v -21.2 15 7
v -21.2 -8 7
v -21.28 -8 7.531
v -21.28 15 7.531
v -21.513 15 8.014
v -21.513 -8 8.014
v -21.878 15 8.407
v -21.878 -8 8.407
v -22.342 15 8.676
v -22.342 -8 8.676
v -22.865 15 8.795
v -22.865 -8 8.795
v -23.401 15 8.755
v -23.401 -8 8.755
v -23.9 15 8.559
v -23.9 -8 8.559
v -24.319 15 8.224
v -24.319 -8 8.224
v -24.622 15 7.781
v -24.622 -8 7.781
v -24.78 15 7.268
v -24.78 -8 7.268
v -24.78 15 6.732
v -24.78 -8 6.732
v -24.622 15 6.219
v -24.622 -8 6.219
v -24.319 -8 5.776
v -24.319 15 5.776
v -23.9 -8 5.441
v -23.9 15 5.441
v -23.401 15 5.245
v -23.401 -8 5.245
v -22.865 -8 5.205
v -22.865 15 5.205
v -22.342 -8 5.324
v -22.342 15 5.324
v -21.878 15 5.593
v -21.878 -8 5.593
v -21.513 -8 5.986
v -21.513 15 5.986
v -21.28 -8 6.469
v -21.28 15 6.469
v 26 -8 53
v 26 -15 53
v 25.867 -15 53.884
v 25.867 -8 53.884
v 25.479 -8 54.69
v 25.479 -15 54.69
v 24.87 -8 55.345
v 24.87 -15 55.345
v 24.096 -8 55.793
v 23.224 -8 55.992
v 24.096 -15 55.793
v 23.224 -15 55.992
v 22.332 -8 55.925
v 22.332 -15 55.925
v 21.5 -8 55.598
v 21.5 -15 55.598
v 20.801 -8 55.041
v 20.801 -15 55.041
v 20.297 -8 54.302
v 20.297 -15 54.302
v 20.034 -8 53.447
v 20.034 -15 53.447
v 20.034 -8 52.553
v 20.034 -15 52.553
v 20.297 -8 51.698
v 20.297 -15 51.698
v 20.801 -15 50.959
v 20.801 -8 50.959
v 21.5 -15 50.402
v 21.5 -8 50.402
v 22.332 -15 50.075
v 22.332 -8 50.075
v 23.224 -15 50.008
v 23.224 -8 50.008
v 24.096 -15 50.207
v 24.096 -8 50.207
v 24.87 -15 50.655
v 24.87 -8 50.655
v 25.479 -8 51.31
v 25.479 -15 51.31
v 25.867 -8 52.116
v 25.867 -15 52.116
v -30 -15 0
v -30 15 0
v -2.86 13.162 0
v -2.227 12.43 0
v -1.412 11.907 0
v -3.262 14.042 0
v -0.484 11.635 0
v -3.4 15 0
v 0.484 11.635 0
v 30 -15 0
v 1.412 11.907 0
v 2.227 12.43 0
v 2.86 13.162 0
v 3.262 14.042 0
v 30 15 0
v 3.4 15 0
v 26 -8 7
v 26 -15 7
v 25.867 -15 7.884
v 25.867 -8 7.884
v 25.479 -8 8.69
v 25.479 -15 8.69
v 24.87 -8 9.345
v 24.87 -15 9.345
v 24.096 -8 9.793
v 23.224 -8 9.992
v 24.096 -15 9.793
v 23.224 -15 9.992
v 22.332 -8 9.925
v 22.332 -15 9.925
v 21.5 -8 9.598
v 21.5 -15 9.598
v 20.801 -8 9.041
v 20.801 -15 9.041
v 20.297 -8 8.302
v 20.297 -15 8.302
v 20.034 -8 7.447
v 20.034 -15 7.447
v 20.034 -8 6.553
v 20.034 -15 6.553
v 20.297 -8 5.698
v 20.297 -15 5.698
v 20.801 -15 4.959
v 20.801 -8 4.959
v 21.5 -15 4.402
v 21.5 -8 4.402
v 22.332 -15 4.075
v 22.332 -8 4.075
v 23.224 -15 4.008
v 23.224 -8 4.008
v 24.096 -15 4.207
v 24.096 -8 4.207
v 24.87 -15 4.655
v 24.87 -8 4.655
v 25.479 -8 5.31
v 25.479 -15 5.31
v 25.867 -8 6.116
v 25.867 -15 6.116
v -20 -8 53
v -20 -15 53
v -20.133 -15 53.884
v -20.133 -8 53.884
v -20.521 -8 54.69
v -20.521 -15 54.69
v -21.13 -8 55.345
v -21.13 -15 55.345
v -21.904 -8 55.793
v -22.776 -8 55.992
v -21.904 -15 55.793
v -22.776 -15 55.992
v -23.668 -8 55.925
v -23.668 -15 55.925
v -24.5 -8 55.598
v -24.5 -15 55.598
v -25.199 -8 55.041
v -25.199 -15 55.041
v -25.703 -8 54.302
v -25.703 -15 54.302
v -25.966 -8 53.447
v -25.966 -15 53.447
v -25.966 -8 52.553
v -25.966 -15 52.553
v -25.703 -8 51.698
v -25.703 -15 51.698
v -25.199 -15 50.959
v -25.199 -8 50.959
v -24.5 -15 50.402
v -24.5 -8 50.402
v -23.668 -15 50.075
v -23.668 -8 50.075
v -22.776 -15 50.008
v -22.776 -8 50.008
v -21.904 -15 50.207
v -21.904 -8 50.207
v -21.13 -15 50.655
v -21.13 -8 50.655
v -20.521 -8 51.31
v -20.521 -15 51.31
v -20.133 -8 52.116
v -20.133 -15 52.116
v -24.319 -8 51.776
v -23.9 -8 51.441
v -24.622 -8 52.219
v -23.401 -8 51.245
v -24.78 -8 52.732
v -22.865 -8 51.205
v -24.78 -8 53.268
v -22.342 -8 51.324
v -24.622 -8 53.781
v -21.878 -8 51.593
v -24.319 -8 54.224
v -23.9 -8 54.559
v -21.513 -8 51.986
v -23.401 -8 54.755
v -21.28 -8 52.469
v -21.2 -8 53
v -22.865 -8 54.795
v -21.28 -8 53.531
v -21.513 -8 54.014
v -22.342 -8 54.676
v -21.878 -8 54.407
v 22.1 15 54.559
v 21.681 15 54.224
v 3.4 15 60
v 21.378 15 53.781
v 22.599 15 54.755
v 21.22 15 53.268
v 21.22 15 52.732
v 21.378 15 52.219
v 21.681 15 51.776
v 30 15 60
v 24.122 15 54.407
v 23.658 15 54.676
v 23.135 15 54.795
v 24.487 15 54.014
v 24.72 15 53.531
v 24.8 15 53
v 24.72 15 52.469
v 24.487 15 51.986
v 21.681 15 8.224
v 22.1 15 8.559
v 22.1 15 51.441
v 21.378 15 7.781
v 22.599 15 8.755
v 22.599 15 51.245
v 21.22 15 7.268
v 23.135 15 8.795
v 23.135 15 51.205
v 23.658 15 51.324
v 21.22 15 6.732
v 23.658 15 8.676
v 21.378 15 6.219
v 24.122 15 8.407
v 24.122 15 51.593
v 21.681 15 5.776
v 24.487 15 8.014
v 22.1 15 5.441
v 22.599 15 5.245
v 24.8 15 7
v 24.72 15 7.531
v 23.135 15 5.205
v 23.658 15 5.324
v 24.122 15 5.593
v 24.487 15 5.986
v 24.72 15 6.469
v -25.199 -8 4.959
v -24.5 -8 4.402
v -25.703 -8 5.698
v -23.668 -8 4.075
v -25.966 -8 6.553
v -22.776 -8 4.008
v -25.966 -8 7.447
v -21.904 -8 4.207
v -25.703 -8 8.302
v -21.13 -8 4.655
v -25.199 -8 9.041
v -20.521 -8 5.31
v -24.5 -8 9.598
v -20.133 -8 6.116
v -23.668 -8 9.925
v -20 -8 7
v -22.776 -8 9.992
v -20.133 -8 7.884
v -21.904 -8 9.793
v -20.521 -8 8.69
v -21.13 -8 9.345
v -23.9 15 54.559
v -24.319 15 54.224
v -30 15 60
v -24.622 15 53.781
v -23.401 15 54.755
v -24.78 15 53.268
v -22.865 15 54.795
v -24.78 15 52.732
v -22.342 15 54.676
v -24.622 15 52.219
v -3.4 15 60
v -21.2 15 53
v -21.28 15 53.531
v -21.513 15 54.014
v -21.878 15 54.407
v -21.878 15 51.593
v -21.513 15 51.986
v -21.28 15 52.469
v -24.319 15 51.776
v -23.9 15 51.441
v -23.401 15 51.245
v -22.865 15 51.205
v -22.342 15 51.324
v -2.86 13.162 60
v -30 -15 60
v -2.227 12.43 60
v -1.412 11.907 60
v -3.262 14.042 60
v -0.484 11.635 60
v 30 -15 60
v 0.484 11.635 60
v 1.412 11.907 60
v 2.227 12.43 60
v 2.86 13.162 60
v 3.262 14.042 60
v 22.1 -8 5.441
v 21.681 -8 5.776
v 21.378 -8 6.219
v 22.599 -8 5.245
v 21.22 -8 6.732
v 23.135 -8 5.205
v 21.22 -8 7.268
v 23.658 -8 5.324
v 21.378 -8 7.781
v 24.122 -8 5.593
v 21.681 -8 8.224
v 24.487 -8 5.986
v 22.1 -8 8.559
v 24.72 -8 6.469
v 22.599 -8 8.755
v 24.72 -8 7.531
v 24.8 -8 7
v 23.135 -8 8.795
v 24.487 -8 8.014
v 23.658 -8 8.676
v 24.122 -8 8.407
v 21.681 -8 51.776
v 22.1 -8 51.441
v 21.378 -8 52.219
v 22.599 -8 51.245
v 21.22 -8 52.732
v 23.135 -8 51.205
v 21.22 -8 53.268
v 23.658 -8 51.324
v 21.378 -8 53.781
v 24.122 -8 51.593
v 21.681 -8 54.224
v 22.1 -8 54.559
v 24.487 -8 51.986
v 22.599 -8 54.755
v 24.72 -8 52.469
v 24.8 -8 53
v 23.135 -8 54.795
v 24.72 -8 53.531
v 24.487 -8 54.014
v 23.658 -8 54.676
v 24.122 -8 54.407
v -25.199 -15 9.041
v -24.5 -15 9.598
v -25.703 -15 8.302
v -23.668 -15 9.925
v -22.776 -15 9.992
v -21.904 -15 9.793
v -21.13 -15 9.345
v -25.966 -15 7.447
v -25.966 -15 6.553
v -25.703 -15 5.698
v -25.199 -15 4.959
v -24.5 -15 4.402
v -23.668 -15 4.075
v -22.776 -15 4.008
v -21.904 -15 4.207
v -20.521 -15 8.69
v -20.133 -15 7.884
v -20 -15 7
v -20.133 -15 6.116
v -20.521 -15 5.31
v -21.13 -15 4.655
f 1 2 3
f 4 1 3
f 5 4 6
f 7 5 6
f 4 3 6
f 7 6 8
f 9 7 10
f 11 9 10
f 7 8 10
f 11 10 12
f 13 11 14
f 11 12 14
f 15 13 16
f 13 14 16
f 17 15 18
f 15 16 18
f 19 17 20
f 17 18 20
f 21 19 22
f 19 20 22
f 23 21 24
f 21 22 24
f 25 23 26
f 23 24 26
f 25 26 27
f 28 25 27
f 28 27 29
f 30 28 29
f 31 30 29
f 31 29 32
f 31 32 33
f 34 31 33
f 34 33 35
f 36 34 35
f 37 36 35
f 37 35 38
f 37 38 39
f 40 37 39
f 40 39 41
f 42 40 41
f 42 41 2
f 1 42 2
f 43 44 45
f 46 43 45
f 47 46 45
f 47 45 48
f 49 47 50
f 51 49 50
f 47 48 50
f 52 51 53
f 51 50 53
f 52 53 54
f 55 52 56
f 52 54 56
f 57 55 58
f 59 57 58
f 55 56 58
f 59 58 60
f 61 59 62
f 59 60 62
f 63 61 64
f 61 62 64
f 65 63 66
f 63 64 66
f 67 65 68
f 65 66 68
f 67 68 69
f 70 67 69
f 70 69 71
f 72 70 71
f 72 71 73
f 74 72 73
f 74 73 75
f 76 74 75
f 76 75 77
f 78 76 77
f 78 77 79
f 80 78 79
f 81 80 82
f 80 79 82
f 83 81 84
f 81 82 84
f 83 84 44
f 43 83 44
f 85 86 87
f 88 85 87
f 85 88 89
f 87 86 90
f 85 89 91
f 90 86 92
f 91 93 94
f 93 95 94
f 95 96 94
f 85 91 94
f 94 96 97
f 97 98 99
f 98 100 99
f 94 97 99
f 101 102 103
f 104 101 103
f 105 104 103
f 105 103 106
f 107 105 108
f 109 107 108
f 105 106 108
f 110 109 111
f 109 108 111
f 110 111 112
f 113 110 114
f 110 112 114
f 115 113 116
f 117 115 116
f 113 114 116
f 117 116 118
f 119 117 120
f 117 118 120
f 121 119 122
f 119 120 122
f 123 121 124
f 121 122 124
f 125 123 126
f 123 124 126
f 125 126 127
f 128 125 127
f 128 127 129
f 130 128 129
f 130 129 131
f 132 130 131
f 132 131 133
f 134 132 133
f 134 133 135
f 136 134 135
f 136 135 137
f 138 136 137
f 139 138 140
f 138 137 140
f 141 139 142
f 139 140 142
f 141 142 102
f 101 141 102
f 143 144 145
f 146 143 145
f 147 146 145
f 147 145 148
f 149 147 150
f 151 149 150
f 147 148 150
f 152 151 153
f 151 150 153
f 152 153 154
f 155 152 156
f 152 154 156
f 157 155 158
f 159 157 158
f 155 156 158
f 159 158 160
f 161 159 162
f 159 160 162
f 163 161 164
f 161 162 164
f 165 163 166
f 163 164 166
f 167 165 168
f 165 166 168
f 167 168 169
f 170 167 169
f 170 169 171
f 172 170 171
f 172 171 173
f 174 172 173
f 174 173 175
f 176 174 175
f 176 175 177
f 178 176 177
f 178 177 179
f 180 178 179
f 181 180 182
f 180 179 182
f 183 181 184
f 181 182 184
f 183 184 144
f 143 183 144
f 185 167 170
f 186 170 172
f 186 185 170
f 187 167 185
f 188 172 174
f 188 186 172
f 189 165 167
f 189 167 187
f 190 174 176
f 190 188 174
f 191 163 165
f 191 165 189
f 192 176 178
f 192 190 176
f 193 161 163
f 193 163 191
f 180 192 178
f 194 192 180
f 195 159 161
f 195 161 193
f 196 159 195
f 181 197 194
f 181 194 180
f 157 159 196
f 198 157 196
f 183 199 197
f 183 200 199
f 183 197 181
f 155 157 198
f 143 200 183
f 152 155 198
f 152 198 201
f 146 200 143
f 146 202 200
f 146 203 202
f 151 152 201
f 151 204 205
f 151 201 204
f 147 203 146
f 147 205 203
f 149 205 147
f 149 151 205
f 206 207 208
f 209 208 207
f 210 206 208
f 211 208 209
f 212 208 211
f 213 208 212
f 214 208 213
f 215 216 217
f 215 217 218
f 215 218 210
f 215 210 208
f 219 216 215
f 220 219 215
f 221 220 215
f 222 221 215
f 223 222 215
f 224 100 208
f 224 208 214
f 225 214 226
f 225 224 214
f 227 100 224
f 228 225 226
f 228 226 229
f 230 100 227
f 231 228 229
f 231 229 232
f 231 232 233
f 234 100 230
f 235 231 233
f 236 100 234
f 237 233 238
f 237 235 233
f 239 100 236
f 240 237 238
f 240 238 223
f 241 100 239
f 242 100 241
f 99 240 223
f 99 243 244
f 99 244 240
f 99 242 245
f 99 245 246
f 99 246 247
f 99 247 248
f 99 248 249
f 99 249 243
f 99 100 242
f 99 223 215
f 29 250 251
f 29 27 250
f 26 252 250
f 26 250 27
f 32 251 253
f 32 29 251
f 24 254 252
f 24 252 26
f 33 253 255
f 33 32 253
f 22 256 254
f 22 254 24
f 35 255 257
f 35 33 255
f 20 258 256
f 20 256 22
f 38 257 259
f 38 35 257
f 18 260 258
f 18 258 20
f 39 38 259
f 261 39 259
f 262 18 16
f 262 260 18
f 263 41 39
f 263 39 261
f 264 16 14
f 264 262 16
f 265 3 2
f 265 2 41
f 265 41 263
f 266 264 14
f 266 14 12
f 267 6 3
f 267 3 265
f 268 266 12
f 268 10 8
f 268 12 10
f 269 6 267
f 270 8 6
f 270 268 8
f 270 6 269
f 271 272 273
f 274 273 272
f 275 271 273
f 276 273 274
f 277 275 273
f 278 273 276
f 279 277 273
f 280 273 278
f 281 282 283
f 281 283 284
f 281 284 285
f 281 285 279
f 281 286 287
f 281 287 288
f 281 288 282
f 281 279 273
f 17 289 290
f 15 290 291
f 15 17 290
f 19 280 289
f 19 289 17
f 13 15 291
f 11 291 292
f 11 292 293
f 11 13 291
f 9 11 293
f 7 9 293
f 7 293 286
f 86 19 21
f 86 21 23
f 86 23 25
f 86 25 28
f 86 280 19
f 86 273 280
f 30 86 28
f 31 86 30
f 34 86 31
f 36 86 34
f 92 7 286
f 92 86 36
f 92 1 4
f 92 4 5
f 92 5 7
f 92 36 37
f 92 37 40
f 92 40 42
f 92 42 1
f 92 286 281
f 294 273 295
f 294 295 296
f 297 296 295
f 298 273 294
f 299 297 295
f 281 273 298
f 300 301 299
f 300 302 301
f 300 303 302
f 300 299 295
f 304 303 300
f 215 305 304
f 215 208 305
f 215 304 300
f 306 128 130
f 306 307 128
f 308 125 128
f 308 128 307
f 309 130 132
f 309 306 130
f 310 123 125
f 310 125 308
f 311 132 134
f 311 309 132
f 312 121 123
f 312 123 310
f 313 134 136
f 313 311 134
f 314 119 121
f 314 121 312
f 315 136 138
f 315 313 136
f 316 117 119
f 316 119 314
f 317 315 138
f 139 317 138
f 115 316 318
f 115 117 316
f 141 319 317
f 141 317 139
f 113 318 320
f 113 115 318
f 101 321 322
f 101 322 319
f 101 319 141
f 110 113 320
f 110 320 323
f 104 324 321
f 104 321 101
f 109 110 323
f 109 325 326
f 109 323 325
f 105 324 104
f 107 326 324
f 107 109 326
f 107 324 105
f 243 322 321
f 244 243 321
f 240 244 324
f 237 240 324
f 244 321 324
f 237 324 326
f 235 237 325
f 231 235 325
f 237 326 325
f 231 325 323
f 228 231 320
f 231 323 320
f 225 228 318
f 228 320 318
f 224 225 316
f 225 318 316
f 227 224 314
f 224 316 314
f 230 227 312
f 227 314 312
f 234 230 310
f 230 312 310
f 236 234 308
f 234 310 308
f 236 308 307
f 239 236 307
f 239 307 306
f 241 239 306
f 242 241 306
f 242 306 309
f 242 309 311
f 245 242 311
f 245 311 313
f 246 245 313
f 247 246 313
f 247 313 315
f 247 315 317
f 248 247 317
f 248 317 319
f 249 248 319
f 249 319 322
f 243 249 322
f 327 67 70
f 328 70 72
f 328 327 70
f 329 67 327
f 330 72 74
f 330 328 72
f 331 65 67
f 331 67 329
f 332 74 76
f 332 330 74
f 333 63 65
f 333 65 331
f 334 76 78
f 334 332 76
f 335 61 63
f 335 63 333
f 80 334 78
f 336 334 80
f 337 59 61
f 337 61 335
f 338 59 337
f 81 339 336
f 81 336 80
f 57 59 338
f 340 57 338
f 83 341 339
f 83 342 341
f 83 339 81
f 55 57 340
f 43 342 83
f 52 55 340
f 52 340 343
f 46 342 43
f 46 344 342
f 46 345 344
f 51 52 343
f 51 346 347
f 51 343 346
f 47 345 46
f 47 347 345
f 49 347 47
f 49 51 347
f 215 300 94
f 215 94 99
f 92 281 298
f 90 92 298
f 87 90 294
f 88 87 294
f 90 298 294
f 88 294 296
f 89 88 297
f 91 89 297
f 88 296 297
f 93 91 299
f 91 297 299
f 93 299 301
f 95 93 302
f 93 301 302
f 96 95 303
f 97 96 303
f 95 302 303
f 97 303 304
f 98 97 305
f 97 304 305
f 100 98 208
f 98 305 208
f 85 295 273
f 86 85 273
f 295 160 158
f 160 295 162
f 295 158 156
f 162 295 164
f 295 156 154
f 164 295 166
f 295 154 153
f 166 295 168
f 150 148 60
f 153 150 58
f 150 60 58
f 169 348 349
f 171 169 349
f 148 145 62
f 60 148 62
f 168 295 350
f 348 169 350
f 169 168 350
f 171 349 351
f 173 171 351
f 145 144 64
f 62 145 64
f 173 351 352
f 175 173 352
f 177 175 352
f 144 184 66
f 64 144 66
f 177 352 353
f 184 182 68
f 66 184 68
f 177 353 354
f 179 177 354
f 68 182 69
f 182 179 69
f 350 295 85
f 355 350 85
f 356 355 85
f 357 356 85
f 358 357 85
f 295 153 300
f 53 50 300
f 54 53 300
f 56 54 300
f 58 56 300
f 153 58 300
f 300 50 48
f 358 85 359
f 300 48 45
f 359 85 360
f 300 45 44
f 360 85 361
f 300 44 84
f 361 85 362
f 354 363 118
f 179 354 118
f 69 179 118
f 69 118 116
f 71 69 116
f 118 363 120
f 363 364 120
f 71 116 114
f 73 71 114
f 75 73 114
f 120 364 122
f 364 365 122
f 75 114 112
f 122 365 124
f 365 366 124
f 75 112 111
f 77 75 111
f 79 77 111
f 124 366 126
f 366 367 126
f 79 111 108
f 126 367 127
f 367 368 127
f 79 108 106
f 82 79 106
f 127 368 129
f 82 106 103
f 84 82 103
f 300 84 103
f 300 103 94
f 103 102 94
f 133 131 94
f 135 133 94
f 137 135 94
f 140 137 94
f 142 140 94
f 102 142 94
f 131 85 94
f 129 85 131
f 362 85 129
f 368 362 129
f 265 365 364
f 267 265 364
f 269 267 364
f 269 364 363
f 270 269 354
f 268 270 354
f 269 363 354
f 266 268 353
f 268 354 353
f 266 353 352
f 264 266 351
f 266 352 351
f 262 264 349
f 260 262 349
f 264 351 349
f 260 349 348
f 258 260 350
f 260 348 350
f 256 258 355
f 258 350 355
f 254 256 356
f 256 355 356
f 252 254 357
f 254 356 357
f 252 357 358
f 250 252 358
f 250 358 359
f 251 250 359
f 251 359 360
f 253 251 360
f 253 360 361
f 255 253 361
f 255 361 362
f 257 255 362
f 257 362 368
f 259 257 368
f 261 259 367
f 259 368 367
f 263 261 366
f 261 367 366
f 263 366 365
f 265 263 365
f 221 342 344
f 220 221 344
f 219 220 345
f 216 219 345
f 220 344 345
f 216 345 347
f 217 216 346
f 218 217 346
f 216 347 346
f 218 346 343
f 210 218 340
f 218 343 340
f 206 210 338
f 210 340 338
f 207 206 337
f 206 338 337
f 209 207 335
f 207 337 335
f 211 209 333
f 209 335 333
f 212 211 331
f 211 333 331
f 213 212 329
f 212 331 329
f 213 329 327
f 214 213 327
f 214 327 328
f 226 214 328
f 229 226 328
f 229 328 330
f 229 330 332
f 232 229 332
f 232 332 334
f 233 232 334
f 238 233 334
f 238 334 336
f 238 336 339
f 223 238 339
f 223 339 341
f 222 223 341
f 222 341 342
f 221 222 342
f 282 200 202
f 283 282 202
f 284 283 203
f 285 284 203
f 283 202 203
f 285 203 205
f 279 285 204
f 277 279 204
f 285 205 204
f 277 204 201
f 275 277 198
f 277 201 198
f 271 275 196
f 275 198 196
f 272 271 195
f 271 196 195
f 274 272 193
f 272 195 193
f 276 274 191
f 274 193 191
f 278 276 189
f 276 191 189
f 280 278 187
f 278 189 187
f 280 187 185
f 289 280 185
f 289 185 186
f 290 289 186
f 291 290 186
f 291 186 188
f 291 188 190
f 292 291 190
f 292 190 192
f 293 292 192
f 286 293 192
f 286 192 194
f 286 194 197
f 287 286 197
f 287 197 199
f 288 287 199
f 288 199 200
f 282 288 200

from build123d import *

# Parameters (mm, degrees)
F0_W      = 60
F0_H      = 30
F1_DEPTH  = 60
F2_R      = 3.4
F3_DEPTH  = 60.001
F4_R      = 1.8
F5_DEPTH  = 30.001
F6_R      = 3
F7_DEPTH  = 7
F8_R      = 3
F9_DEPTH  = 7
F10_R     = 3
F11_DEPTH = 7
F12_R     = 3
F13_DEPTH = 7


with BuildPart() as f1:
    # F0 (on Top) → F1 (new body)
    with BuildSketch(Plane.XY):
        Rectangle(F0_W, F0_H)
    extrude(amount=F1_DEPTH)

    # F2 (on face) → F3 (cut, through all)
    with BuildSketch(Plane.XY.offset(60)):
        with Locations((0, 15)):
            Circle(F2_R)
    extrude(amount=-F3_DEPTH, mode=Mode.SUBTRACT)

    # F4 (on face) → F5 (cut, through all)
    with BuildSketch(Plane.XZ.offset(15)):
        with Locations((-23, 53)):
            Circle(F4_R)
        with Locations((23, 53)):
            Circle(F4_R)
        with Locations((23, 7)):
            Circle(F4_R)
        with Locations((-23, 7)):
            Circle(F4_R)
    extrude(amount=-F5_DEPTH, mode=Mode.SUBTRACT)

    # F6 (on face) → F7 (cut)
    with BuildSketch(Plane.XZ.offset(15)):
        with Locations((-23, 53)):
            Circle(F6_R)
    extrude(amount=-F7_DEPTH, mode=Mode.SUBTRACT)

    # F8 (on face) → F9 (cut)
    with BuildSketch(Plane.XZ.offset(15)):
        with Locations((23, 53)):
            Circle(F8_R)
    extrude(amount=-F9_DEPTH, mode=Mode.SUBTRACT)

    # F10 (on face) → F11 (cut)
    with BuildSketch(Plane.XZ.offset(15)):
        with Locations((-23, 7)):
            Circle(F10_R)
    extrude(amount=-F11_DEPTH, mode=Mode.SUBTRACT)

    # F12 (on face) → F13 (cut)
    with BuildSketch(Plane.XZ.offset(15)):
        with Locations((23, 7)):
            Circle(F12_R)
    extrude(amount=-F13_DEPTH, mode=Mode.SUBTRACT)


solid = f1.part
